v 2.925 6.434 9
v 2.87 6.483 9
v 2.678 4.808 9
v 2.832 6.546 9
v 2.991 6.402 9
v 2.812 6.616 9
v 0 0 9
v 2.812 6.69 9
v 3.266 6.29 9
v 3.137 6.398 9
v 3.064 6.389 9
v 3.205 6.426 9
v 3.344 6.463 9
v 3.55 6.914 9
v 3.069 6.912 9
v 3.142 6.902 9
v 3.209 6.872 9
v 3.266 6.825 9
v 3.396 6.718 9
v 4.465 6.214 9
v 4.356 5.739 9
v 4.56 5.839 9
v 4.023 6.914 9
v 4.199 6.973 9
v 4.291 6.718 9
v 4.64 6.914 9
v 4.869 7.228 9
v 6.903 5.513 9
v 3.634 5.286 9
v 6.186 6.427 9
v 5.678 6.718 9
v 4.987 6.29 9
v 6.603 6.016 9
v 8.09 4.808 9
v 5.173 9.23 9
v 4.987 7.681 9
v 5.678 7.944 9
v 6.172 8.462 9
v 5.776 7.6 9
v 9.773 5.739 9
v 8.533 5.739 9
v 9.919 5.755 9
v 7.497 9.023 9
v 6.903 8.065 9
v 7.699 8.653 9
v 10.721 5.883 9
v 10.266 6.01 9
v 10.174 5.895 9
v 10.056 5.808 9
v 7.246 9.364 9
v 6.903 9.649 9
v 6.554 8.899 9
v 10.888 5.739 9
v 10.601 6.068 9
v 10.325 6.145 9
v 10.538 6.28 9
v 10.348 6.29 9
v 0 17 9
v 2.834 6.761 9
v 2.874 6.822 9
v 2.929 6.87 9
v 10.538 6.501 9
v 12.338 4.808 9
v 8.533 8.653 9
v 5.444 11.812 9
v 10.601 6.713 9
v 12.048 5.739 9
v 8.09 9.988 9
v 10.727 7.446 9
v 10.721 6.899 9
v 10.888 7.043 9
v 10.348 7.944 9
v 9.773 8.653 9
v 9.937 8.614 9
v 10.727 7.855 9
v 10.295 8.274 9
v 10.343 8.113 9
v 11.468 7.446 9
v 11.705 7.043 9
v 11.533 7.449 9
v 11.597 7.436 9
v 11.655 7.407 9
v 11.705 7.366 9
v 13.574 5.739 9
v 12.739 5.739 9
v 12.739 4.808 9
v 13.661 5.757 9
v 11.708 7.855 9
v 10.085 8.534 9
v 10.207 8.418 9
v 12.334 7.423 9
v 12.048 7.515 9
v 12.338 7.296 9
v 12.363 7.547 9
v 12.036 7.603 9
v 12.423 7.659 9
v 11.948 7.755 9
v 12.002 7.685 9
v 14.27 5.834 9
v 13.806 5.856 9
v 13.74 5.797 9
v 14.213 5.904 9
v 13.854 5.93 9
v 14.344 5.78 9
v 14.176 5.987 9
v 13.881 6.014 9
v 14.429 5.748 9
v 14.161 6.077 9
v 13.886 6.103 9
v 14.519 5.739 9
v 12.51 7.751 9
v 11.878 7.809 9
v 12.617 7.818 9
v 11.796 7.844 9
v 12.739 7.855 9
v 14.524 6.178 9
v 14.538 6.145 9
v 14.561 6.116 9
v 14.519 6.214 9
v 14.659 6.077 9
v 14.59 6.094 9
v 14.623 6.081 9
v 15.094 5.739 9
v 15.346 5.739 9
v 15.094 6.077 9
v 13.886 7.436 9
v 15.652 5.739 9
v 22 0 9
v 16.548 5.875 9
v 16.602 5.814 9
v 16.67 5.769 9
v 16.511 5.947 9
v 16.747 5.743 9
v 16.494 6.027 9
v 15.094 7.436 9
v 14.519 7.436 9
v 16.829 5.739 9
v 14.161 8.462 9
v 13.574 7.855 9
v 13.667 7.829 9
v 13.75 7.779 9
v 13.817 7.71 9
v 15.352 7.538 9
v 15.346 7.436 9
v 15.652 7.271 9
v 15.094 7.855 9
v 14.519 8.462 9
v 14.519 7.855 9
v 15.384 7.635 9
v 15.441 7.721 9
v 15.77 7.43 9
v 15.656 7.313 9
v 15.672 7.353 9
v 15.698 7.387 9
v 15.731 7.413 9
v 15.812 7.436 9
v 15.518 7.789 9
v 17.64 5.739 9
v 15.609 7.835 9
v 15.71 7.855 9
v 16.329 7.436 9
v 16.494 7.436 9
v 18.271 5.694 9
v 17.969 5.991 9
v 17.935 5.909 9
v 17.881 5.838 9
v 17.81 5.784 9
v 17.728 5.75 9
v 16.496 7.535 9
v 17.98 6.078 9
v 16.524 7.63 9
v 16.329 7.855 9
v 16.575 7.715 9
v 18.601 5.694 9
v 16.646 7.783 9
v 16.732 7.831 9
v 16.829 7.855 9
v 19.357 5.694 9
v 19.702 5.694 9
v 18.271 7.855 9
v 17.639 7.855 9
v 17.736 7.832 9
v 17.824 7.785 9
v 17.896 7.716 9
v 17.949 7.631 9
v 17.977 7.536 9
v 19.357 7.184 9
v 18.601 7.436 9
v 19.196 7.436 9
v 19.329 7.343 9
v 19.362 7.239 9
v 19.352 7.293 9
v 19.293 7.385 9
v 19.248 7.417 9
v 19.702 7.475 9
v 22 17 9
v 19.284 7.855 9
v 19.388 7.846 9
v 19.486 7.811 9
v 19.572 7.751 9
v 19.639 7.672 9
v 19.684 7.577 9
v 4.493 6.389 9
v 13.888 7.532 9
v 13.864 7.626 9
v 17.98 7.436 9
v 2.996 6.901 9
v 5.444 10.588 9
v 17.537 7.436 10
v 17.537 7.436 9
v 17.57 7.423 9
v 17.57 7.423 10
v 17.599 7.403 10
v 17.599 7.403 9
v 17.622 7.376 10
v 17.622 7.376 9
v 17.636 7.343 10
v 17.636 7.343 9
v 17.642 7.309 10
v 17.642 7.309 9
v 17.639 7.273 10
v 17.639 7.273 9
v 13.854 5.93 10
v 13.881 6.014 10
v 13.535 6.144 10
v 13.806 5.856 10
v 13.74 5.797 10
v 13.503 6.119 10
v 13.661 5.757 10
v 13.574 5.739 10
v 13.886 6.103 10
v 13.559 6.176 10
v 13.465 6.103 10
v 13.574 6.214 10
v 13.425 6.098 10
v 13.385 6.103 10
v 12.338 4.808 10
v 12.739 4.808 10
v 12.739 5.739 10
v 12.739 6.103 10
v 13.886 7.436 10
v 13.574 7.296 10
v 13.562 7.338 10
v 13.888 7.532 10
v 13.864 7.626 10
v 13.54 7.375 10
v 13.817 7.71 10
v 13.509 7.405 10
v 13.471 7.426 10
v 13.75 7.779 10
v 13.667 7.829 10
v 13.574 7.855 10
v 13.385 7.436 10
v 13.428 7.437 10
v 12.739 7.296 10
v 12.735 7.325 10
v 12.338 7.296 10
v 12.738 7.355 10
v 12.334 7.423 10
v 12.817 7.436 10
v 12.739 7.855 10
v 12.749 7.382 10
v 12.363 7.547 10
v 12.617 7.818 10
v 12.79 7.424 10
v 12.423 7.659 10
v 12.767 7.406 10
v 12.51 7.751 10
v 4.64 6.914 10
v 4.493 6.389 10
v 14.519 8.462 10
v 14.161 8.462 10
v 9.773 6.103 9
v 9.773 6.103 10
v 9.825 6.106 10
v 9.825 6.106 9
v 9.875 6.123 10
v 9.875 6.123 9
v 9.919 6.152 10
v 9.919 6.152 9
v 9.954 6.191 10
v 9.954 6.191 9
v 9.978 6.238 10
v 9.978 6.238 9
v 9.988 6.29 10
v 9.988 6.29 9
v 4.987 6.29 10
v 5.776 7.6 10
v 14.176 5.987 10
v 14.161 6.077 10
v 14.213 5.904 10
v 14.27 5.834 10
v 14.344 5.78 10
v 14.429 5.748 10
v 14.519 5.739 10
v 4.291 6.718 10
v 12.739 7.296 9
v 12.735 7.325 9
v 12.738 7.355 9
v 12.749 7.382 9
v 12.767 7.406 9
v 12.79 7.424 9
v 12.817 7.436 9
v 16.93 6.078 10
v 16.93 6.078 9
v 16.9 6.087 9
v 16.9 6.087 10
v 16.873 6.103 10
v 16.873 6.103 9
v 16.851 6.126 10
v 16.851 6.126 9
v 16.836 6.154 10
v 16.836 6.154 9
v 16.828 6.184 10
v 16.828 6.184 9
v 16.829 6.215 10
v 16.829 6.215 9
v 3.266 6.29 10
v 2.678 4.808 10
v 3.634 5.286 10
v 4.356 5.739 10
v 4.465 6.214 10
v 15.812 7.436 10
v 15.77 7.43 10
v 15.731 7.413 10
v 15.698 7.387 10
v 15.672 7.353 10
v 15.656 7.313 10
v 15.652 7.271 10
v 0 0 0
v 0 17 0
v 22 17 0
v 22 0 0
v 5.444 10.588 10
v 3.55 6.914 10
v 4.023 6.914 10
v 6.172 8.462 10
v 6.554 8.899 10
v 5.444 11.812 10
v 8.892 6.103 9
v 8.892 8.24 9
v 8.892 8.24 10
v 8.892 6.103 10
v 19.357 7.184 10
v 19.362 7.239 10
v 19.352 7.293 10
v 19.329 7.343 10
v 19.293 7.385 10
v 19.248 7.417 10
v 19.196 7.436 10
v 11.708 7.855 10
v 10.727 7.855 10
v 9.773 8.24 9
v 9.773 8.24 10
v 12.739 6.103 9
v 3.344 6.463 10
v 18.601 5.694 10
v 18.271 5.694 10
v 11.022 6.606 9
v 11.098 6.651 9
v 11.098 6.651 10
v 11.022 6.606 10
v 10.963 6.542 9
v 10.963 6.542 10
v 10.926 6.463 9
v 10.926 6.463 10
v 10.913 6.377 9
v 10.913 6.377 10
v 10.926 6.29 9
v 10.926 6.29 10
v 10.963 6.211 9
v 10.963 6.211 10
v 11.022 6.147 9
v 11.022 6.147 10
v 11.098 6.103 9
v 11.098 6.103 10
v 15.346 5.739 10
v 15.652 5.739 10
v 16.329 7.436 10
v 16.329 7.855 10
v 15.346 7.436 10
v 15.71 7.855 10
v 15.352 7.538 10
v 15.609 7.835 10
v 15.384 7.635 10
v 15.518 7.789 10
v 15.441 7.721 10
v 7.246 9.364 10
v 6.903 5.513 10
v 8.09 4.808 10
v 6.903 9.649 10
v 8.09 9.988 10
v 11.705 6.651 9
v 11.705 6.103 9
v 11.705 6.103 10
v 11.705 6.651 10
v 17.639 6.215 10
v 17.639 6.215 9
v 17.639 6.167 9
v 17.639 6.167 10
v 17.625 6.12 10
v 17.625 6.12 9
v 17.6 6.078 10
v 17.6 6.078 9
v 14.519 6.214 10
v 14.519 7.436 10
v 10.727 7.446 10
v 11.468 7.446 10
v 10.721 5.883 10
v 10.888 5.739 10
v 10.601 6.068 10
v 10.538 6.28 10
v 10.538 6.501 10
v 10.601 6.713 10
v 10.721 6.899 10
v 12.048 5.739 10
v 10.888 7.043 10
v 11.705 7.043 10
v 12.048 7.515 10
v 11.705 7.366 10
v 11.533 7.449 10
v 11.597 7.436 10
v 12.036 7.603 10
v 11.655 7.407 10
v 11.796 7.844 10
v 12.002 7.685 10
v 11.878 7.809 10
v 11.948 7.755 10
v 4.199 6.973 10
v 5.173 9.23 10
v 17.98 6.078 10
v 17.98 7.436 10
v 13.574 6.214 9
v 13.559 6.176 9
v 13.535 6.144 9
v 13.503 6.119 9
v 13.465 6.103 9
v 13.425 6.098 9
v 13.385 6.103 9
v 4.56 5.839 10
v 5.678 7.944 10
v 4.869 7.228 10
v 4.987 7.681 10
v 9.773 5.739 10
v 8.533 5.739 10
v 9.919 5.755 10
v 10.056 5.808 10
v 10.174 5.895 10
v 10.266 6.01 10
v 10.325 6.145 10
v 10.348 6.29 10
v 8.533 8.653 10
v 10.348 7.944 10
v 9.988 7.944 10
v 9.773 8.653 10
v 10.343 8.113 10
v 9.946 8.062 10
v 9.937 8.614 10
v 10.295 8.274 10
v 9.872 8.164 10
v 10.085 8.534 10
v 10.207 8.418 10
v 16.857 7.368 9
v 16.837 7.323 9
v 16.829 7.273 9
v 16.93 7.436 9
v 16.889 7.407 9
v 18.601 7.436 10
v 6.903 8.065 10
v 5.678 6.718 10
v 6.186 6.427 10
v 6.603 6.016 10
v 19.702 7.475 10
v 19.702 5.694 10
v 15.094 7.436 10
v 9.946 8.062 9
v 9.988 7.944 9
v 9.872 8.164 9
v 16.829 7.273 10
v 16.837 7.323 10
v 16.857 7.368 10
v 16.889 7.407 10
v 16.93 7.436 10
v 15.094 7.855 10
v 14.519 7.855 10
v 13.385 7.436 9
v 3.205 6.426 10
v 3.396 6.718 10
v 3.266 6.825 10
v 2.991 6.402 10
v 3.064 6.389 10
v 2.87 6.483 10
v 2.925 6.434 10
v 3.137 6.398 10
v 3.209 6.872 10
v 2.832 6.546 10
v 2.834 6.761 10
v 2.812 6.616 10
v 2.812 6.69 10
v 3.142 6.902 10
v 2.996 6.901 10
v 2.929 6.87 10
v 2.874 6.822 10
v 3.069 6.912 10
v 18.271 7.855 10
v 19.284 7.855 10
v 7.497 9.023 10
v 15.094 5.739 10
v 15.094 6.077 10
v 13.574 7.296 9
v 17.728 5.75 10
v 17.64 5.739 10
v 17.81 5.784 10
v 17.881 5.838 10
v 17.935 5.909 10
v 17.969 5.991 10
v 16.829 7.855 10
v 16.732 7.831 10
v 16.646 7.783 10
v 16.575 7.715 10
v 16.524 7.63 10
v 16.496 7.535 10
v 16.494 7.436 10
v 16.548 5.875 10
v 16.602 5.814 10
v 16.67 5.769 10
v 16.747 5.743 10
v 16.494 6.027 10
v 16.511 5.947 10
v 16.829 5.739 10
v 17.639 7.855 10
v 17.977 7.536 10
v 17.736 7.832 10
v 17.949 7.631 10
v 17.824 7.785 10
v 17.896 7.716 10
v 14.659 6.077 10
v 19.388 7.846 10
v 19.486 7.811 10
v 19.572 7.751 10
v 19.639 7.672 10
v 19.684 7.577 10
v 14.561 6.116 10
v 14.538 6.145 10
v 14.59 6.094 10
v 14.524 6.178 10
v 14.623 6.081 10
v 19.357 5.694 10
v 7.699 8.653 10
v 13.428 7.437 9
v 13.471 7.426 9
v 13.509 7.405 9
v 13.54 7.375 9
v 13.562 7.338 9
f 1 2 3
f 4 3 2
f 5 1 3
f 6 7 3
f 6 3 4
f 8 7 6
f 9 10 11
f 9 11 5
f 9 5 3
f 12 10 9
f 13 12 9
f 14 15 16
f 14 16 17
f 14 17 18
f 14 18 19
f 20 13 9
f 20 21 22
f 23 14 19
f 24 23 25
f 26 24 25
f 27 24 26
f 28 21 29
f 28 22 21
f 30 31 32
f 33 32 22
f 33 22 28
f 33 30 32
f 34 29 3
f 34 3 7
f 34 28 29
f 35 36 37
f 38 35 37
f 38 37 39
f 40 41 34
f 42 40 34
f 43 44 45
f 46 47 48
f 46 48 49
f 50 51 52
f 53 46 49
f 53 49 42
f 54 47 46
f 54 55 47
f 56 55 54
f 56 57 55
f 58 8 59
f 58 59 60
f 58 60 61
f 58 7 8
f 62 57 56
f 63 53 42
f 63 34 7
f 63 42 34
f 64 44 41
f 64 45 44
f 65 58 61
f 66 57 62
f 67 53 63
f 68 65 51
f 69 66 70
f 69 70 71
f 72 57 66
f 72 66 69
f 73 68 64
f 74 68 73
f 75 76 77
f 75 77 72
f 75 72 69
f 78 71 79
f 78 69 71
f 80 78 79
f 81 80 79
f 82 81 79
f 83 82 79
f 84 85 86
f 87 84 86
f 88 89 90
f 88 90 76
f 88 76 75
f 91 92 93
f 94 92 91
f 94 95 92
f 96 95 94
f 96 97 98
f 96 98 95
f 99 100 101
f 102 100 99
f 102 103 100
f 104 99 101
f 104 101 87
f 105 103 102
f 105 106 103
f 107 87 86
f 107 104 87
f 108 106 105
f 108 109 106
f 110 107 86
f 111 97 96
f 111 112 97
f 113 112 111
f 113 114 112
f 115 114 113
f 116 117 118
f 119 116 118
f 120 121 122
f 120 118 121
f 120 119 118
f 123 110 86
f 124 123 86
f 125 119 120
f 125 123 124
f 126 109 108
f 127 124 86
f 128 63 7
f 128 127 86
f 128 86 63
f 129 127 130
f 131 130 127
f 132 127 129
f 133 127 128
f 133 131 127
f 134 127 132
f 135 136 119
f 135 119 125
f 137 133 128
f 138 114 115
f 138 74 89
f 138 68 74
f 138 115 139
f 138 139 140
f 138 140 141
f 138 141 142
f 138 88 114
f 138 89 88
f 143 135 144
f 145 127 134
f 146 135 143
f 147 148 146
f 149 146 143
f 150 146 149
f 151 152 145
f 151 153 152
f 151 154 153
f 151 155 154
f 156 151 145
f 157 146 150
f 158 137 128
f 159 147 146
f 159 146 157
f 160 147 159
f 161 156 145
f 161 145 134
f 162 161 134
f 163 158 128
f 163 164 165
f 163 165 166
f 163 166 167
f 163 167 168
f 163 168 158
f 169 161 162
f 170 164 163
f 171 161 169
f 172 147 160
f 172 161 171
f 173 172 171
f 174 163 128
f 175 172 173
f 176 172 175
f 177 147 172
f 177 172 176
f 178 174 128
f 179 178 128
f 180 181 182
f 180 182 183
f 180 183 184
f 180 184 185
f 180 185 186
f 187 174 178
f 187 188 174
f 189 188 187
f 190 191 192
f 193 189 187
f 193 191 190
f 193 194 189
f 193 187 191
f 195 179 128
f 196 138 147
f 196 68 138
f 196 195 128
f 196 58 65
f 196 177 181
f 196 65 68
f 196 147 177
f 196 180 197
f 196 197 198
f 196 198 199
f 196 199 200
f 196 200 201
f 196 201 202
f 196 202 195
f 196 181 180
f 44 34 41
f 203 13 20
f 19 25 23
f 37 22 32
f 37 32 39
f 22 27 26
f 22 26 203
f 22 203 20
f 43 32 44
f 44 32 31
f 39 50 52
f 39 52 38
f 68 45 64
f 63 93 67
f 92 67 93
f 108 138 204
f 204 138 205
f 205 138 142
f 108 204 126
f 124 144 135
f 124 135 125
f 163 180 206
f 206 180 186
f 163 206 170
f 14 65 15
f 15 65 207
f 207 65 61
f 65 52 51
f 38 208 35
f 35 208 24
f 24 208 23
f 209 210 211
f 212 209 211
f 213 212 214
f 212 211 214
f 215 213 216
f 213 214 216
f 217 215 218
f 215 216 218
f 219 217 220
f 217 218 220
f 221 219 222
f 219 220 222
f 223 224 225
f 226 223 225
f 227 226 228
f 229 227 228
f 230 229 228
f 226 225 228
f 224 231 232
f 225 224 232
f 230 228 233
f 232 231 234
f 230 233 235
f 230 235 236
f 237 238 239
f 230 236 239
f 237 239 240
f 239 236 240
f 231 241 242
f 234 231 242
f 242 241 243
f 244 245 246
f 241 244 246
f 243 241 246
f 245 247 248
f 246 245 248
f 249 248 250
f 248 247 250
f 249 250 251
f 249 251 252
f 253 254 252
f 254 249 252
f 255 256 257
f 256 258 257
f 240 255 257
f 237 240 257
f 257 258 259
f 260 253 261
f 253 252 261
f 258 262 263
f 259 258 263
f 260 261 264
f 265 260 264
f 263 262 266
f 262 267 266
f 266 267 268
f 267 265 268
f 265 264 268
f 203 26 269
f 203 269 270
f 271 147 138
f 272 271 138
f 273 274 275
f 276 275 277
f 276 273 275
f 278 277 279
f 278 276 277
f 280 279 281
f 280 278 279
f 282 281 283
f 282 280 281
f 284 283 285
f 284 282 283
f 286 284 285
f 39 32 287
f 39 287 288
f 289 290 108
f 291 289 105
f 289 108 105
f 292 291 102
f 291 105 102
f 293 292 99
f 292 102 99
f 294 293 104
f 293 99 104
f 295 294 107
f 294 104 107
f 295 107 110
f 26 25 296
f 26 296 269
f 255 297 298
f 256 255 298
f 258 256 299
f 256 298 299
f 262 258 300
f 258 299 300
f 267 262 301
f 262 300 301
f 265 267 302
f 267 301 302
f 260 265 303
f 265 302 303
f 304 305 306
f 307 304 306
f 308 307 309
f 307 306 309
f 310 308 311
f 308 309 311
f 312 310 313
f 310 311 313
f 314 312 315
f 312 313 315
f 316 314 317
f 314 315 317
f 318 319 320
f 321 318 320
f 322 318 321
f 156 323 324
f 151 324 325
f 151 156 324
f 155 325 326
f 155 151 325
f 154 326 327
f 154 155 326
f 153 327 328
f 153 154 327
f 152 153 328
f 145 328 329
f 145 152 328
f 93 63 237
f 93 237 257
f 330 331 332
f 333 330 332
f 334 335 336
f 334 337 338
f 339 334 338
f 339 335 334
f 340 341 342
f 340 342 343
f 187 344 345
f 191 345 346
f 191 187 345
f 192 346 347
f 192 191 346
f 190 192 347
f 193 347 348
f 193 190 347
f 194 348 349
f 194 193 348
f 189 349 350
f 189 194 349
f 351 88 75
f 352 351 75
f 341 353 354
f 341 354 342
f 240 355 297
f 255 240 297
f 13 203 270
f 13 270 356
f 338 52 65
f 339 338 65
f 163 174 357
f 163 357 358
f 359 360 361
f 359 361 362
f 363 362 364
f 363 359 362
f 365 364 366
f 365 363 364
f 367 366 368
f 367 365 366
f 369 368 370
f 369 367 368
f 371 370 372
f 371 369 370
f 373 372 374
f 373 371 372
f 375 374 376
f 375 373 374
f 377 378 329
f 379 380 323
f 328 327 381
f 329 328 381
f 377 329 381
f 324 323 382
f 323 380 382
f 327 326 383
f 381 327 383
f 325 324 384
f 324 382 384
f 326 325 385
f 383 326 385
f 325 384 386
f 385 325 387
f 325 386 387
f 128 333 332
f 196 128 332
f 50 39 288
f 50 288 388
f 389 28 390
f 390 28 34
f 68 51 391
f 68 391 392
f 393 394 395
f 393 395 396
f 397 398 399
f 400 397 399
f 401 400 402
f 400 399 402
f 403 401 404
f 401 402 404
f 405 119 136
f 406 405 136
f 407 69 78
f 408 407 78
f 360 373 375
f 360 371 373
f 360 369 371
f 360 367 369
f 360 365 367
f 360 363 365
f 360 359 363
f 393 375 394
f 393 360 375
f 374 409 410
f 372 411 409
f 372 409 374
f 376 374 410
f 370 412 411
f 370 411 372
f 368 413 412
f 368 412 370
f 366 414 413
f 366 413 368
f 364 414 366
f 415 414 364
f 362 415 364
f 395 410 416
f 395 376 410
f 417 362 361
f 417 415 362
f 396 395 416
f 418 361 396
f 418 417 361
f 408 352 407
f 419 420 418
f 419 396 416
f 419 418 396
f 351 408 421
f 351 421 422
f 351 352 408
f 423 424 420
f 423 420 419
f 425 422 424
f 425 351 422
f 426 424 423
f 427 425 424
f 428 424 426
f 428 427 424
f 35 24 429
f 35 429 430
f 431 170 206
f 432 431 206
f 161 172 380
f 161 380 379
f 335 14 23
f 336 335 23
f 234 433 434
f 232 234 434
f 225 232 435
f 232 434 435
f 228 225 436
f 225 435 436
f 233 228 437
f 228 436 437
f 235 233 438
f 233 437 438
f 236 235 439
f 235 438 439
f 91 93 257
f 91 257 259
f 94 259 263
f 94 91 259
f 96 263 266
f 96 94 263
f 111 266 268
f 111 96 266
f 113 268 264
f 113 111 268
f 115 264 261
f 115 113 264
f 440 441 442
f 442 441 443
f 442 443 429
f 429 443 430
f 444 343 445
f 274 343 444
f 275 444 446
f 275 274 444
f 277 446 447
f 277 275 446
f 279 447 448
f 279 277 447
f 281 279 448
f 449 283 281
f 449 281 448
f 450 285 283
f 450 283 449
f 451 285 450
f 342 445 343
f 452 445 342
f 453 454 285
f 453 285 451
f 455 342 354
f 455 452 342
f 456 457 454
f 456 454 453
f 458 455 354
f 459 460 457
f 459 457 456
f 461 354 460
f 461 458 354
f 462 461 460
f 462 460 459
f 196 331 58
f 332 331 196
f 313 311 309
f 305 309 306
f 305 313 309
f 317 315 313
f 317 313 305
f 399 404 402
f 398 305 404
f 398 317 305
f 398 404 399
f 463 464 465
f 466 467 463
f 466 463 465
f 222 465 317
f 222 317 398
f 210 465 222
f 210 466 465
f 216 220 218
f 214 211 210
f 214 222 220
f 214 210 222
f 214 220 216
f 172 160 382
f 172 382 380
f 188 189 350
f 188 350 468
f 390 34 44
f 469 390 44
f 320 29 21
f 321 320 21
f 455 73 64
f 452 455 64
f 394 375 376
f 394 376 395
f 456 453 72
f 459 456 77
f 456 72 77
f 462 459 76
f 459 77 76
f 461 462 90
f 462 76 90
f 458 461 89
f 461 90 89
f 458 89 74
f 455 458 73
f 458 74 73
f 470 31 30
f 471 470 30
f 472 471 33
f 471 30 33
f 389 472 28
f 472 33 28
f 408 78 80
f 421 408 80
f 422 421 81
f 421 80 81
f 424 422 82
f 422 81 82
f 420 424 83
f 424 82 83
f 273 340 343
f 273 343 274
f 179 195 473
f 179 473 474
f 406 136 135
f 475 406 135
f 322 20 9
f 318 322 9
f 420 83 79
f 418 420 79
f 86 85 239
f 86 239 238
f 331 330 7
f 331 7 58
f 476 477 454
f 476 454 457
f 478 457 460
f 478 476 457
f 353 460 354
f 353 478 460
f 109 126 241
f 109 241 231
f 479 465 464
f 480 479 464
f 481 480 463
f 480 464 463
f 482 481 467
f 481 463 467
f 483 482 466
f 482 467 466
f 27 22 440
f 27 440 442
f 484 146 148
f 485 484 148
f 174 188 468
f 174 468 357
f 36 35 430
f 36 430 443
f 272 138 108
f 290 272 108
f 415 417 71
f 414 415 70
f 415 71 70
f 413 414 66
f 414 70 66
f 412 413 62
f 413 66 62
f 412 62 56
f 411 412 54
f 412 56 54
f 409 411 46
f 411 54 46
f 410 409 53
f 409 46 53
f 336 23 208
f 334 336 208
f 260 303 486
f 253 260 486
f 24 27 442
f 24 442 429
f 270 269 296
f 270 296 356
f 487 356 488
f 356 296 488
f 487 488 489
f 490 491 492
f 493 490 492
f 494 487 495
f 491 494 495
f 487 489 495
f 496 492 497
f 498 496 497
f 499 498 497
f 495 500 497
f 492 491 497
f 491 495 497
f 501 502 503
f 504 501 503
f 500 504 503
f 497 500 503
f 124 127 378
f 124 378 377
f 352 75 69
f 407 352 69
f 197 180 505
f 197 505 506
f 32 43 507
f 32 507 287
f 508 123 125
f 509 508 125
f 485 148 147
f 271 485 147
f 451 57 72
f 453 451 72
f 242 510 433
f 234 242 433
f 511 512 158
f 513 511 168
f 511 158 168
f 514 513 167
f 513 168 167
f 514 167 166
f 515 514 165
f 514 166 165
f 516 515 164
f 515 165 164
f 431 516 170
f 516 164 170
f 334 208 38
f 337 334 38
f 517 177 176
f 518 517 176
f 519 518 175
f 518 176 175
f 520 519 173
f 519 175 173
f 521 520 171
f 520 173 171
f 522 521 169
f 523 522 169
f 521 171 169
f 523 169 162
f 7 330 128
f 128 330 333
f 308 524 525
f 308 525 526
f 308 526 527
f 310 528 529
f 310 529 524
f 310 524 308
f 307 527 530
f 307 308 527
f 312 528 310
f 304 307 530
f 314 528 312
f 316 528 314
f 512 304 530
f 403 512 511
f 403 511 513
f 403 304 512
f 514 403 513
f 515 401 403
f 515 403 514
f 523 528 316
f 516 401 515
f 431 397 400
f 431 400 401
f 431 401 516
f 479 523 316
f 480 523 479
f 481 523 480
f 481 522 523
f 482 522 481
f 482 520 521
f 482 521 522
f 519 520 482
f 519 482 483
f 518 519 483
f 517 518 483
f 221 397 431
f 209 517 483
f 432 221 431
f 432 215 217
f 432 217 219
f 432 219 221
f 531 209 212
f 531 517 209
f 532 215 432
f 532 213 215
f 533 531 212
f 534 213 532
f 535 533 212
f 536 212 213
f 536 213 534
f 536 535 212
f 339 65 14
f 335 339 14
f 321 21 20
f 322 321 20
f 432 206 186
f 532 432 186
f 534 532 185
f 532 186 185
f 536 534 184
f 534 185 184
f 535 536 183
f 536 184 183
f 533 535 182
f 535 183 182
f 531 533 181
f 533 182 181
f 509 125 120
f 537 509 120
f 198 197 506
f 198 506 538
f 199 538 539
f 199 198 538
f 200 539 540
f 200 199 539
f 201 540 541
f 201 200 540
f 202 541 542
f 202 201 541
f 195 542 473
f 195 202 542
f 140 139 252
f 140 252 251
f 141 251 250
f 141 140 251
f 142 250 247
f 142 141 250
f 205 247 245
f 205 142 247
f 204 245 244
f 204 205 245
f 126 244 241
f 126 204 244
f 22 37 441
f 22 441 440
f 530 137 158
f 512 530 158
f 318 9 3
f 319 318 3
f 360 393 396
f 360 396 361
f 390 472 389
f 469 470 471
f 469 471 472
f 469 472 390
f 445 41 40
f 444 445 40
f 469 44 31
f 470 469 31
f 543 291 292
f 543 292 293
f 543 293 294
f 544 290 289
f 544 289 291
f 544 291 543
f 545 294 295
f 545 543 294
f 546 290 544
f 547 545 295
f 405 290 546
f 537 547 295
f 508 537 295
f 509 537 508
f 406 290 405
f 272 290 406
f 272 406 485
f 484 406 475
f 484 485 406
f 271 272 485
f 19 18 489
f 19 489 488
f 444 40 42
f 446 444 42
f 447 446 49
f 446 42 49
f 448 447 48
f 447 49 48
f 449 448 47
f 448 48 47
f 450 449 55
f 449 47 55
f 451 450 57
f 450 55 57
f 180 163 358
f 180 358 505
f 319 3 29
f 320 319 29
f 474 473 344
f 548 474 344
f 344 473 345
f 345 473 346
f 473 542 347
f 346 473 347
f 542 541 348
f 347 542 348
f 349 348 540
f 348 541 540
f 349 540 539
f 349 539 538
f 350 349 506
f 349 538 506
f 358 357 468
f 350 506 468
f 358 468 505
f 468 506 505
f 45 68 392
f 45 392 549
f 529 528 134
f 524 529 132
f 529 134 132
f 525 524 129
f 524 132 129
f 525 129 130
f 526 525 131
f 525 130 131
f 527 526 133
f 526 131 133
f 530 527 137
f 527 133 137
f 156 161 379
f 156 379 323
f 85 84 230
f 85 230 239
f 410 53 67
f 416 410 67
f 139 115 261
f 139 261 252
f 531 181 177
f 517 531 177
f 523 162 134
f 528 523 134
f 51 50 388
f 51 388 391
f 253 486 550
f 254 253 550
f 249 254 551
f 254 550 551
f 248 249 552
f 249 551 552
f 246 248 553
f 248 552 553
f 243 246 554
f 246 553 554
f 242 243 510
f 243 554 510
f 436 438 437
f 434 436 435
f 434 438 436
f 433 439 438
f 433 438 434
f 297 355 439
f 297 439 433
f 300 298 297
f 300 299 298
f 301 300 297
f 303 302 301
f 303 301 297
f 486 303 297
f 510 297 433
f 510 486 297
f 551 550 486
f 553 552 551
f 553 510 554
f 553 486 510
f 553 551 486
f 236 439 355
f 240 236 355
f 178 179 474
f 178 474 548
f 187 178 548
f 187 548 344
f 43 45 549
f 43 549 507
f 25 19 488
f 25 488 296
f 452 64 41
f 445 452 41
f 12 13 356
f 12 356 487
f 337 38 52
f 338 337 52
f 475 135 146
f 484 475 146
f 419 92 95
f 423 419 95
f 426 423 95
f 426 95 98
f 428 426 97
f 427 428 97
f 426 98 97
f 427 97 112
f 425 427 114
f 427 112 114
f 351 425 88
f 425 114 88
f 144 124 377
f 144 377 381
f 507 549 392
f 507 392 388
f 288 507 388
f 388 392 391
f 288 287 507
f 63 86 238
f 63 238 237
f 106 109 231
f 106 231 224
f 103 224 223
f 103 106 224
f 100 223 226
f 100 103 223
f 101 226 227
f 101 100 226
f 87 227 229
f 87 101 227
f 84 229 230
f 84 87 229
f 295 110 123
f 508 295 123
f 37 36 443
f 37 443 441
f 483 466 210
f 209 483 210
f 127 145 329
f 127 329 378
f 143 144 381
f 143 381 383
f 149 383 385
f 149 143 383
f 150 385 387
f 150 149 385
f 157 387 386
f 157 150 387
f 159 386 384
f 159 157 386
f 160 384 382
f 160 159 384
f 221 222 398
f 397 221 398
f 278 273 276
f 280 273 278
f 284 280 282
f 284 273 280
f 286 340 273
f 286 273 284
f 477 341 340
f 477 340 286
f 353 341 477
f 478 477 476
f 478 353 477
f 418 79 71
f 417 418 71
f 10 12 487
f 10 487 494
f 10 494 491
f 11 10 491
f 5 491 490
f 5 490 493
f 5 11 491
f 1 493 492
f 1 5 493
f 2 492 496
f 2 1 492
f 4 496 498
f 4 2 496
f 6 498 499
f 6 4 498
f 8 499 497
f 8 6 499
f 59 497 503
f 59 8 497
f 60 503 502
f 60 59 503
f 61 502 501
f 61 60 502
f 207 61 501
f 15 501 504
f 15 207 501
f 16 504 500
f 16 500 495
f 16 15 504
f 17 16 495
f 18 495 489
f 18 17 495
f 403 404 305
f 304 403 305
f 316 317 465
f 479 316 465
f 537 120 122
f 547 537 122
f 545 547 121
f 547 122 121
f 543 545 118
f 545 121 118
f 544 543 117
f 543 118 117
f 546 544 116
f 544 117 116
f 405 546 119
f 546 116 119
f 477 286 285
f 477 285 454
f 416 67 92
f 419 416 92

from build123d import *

# Parameters (mm, degrees)
BOSS_EXTRU_1_DEPTH    = 10
BOSS_EXTRU_1_2_DEPTH  = 10
BOSS_EXTRU_1_3_DEPTH  = 10
BOSS_EXTRU_1_4_DEPTH  = 10
BOSS_EXTRU_1_5_DEPTH  = 10
BOSS_EXTRU_1_6_DEPTH  = 10
BOSS_EXTRU_1_7_DEPTH  = 10
BOSS_EXTRU_1_8_DEPTH  = 10
BOSS_EXTRU_1_9_DEPTH  = 10
BOSS_EXTRU_1_10_DEPTH = 10
BOSS_EXTRU_1_11_DEPTH = 10
BOSS_EXTRU_1_12_DEPTH = 10
BOSS_EXTRU_1_13_DEPTH = 10
ESQUISSE2_W           = 22
ESQUISSE2_H           = 17
BOSS_EXTRU_2_DEPTH    = 9


with BuildPart() as part:
    # Esquisse1 → Boss.-Extru.1 (new body)
    with BuildSketch(Plane.XY):
        Polygon((5.443717547, 11.812499229), (3.550061207, 6.914484272), (4.023475292, 6.914484272), (5.443717547, 10.587995489), (6.172046909, 8.462184165), (6.554419824, 8.899181782), align=None)
    extrude(amount=BOSS_EXTRU_1_DEPTH)



with BuildPart() as body_2:
    # Esquisse1 → Boss.-Extru.1 2 (new body)
    with BuildSketch(Plane.XY):
        with BuildLine():
            Line((6.902626833, 8.065470566), (5.678236467, 6.71845465))
            ThreePointArc((5.678236467, 6.71845465), (6.407694377, 6.234618767), (6.902626833, 5.512643789))
            Line((6.902626833, 5.512643789), (8.09044996, 4.808141168))
            Line((8.09044996, 4.808141168), (6.902626833, 8.065470566))
        make_face()
    extrude(amount=BOSS_EXTRU_1_2_DEPTH)


with BuildPart() as body_3:
    # Esquisse1 → Boss.-Extru.1 3 (new body)
    with BuildSketch(Plane.XY):
        Polygon((7.496538396, 9.023251364), (4.987277184, 6.289858676), (5.776031703, 7.600137795), (7.245503612, 9.363504086), (6.902626833, 9.649234735), (8.09044996, 9.988029647), (7.698590784, 8.65325933), align=None)
    extrude(amount=BOSS_EXTRU_1_3_DEPTH)


with BuildPart() as body_4:
    # Esquisse1 → Boss.-Extru.1 4 (new body)
    with BuildSketch(Plane.XY):
        with BuildLine():
            ThreePointArc((19.283756817, 7.855107538), (19.571781089, 7.751485217), (19.70217296, 7.474549255))
            Line((19.70217296, 7.474549255), (19.70217296, 5.694123098))
            Line((19.70217296, 5.694123098), (19.357163158, 5.694123098))
            Line((19.357163158, 5.694123098), (19.357163158, 7.183832057))
            ThreePointArc((19.357163158, 7.183832057), (19.328585973, 7.343227565), (19.195669208, 7.435730089))
            Line((19.195669208, 7.435730089), (18.601077847, 7.435730089))
            Line((18.601077847, 7.435730089), (18.601077847, 5.694123098))
            Line((18.601077847, 5.694123098), (18.270749313, 5.694123098))
            Line((18.270749313, 5.694123098), (18.270749313, 7.855107538))
            Line((18.270749313, 7.855107538), (19.283756817, 7.855107538))
        make_face()
    extrude(amount=BOSS_EXTRU_1_4_DEPTH)


with BuildPart() as body_5:
    # Esquisse1 → Boss.-Extru.1 5 (new body)
    with BuildSketch(Plane.XY):
        with BuildLine():
            Line((16.494479646, 7.435730089), (16.494479646, 6.027121876))
            ThreePointArc((16.494479646, 6.027121876), (16.601754173, 5.813714283), (16.828510675, 5.738666872))
            Line((16.828510675, 5.738666872), (17.640470987, 5.738666872))
            ThreePointArc((17.640470987, 5.738666872), (17.880768825, 5.838201495), (17.980303448, 6.078499332))
            Line((17.980303448, 6.078499332), (17.980303448, 7.435730089))
            ThreePointArc((17.980303448, 7.435730089), (17.896289803, 7.716195302), (17.638564331, 7.855107538))
            Line((17.638564331, 7.855107538), (16.828516054, 7.855107538))
            ThreePointArc((16.828516054, 7.855107538), (16.574641936, 7.714600019), (16.494479646, 7.435730089))
        make_face()
        with BuildLine():
            Line((17.638564331, 7.273362699), (17.638564331, 6.215464578))
            ThreePointArc((17.638564331, 6.215464578), (17.633763509, 6.142841489), (17.599745165, 6.078499332))
            Line((17.599745165, 6.078499332), (16.929772089, 6.078499332))
            ThreePointArc((16.929772089, 6.078499332), (16.85077764, 6.126011144), (16.828516054, 6.215464578))
            Line((16.828516054, 6.215464578), (16.828516054, 7.273362699))
            ThreePointArc((16.828516054, 7.273362699), (16.85715067, 7.368261985), (16.929772089, 7.435730089))
            Line((16.929772089, 7.435730089), (17.537308296, 7.435730089))
            ThreePointArc((17.537308296, 7.435730089), (17.621563701, 7.375517206), (17.638564331, 7.273362699))
        make_face(mode=Mode.SUBTRACT)
    extrude(amount=BOSS_EXTRU_1_5_DEPTH)


with BuildPart() as body_6:
    # Esquisse1 → Boss.-Extru.1 6 (new body)
    with BuildSketch(Plane.XY):
        with BuildLine():
            ThreePointArc((15.811686316, 7.435730089), (15.697522048, 7.386612234), (15.651527288, 7.271154337))
            Line((15.651527288, 7.271154337), (15.651527288, 5.738666872))
            Line((15.651527288, 5.738666872), (15.345769144, 5.738666872))
            Line((15.345769144, 5.738666872), (15.345769144, 7.435730089))
            ThreePointArc((15.345769144, 7.435730089), (15.440912126, 7.720805224), (15.709766935, 7.855107538))
            Line((15.709766935, 7.855107538), (16.328563178, 7.855107538))
            Line((16.328563178, 7.855107538), (16.328563178, 7.435730089))
            Line((16.328563178, 7.435730089), (15.811686316, 7.435730089))
        make_face()
    extrude(amount=BOSS_EXTRU_1_6_DEPTH)


with BuildPart() as body_7:
    # Esquisse1 → Boss.-Extru.1 7 (new body)
    with BuildSketch(Plane.XY):
        with BuildLine():
            Line((14.161212762, 8.462184165), (14.161212762, 6.076587297))
            ThreePointArc((14.161212762, 6.076587297), (14.270058526, 5.833555854), (14.518873285, 5.738672251))
            Line((14.518873285, 5.738672251), (15.09368484, 5.738672251))
            Line((15.09368484, 5.738672251), (15.09368484, 6.076587297))
            Line((15.09368484, 6.076587297), (14.659382776, 6.076587297))
            ThreePointArc((14.659382776, 6.076587297), (14.560703645, 6.116109364), (14.518873285, 6.213832369))
            Line((14.518873285, 6.213832369), (14.518873285, 7.435730089))
            Line((14.518873285, 7.435730089), (15.09368484, 7.435730089))
            Line((15.09368484, 7.435730089), (15.09368484, 7.855107538))
            Line((15.09368484, 7.855107538), (14.518873285, 7.855107538))
            Line((14.518873285, 7.855107538), (14.518873285, 8.462184165))
            Line((14.518873285, 8.462184165), (14.161212762, 8.462184165))
        make_face()
    extrude(amount=BOSS_EXTRU_1_7_DEPTH)


with BuildPart() as body_8:
    # Esquisse1 → Boss.-Extru.1 8 (new body)
    with BuildSketch(Plane.XY):
        with BuildLine():
            ThreePointArc((13.886262231, 6.102623129), (13.805699319, 5.85605539), (13.574383017, 5.738672251))
            Line((13.574383017, 5.738672251), (12.738992267, 5.738672251))
            Line((12.738992267, 5.738672251), (12.738992267, 4.808141168))
            Line((12.738992267, 4.808141168), (12.338004706, 4.808141168))
            Line((12.338004706, 4.808141168), (12.338004706, 7.295933822))
            ThreePointArc((12.338004706, 7.295933822), (12.422689818, 7.658567923), (12.738992267, 7.855107538))
            Line((12.738992267, 7.855107538), (13.574383017, 7.855107538))
            ThreePointArc((13.574383017, 7.855107538), (13.817178537, 7.710011113), (13.886262231, 7.435730089))
            Line((13.886262231, 7.435730089), (13.886262231, 6.102623129))
        make_face()
        with BuildLine():
            Line((13.574383017, 7.295933822), (13.574383017, 6.213832369))
            ThreePointArc((13.574383017, 6.213832369), (13.502737587, 6.119010995), (13.38502778, 6.102623129))
            Line((13.38502778, 6.102623129), (12.738992267, 6.102623129))
            Line((12.738992267, 6.102623129), (12.738992267, 7.295933822))
            ThreePointArc((12.738992267, 7.295933822), (12.749024413, 7.381980031), (12.81696207, 7.435730089))
            Line((12.81696207, 7.435730089), (13.38502778, 7.435730089))
            ThreePointArc((13.38502778, 7.435730089), (13.508658154, 7.405048709), (13.574383017, 7.295933822))
        make_face(mode=Mode.SUBTRACT)
    extrude(amount=BOSS_EXTRU_1_8_DEPTH)


with BuildPart() as body_9:
    # Esquisse1 → Boss.-Extru.1 9 (new body)
    with BuildSketch(Plane.XY):
        with BuildLine():
            Line((10.727068381, 7.446462813), (11.468195577, 7.446462813))
            ThreePointArc((11.468195577, 7.446462813), (11.596758234, 7.435730089), (11.705162978, 7.365787542))
            Line((11.705162978, 7.365787542), (11.705162978, 7.043119919))
            Line((11.705162978, 7.043119919), (10.888410557, 7.043119919))
            ThreePointArc((10.888410557, 7.043119919), (10.530519911, 6.390896085), (10.888410557, 5.738672251))
            Line((10.888410557, 5.738672251), (12.047997327, 5.738672251))
            Line((12.047997327, 5.738672251), (12.047997327, 7.514651407))
            ThreePointArc((12.047997327, 7.514651407), (11.948280035, 7.755390246), (11.707541196, 7.855107538))
            Line((11.707541196, 7.855107538), (10.727068381, 7.855107538))
            Line((10.727068381, 7.855107538), (10.727068381, 7.446462813))
        make_face()
        with BuildLine():
            ThreePointArc((11.097631979, 6.65067692), (10.91259355, 6.376650024), (11.097631979, 6.102623129))
            Line((11.097631979, 6.102623129), (11.705154613, 6.102623129))
            Line((11.705154613, 6.102623129), (11.705154613, 6.65067692))
            Line((11.705154613, 6.65067692), (11.097631979, 6.65067692))
        make_face(mode=Mode.SUBTRACT)
    extrude(amount=BOSS_EXTRU_1_9_DEPTH)


with BuildPart() as body_10:
    # Esquisse1 → Boss.-Extru.1 10 (new body)
    with BuildSketch(Plane.XY):
        with BuildLine():
            Line((8.533065369, 5.73880671), (9.772658698, 5.73880671))
            ThreePointArc((9.772658698, 5.73880671), (10.174227228, 5.895270347), (10.34754256, 6.289858676))
            Line((10.34754256, 6.289858676), (10.34754256, 7.944071011))
            ThreePointArc((10.34754256, 7.944071011), (10.206978339, 8.417727517), (9.772658698, 8.65325933))
            Line((9.772658698, 8.65325933), (8.533065369, 8.65325933))
            Line((8.533065369, 8.65325933), (8.533065369, 5.73880671))
        make_face()
        with BuildLine():
            ThreePointArc((9.772658698, 6.102623129), (9.919227173, 6.151592523), (9.988240146, 6.289858676))
            Line((9.988240146, 6.289858676), (9.988240146, 7.944071011))
            ThreePointArc((9.988240146, 7.944071011), (9.912548031, 8.115618007), (9.772658698, 8.240472493))
            Line((9.772658698, 8.240472493), (8.892367783, 8.240472493))
            Line((8.892367783, 8.240472493), (8.892367783, 6.102623129))
            Line((8.892367783, 6.102623129), (9.772658698, 6.102623129))
        make_face(mode=Mode.SUBTRACT)
    extrude(amount=BOSS_EXTRU_1_10_DEPTH)


with BuildPart() as body_11:
    # Esquisse1 → Boss.-Extru.1 11 (new body)
    with BuildSketch(Plane.XY):
        Polygon((4.355542191, 5.73880671), (4.464623497, 6.213832369), (3.265683859, 6.289858676), (2.677895095, 4.808141168), (3.633556258, 5.286480868), align=None)
    extrude(amount=BOSS_EXTRU_1_11_DEPTH)


with BuildPart() as body_12:
    # Esquisse1 → Boss.-Extru.1 12 (new body)
    with BuildSketch(Plane.XY):
        Polygon((4.199345564, 6.972570668), (5.173183133, 9.229859022), (4.987277184, 7.680642785), (5.678236467, 7.944071011), (4.560132448, 5.83905846), (4.868736322, 7.227775894), align=None)
    extrude(amount=BOSS_EXTRU_1_12_DEPTH)


with BuildPart() as body_13:
    # Esquisse1 → Boss.-Extru.1 13 (new body)
    with BuildSketch(Plane.XY):
        with BuildLine():
            Line((4.49284458, 6.389276558), (3.344161613, 6.46328358))
            Line((3.344161613, 6.46328358), (3.204994268, 6.426280069))
            ThreePointArc((3.204994268, 6.426280069), (2.812494667, 6.690009625), (3.265683859, 6.825023594))
            Line((3.265683859, 6.825023594), (3.396366031, 6.71845465))
            Line((3.396366031, 6.71845465), (4.291345624, 6.71845465))
            Line((4.291345624, 6.71845465), (4.640038971, 6.914484272))
            Line((4.640038971, 6.914484272), (4.49284458, 6.389276558))
        make_face()
    extrude(amount=BOSS_EXTRU_1_13_DEPTH)


with BuildPart() as part_1:
    add(part.part)

    add(body_2.part)  # Boss.-Extru.2 merges body 2

    add(body_3.part)  # Boss.-Extru.2 merges body 3

    add(body_4.part)  # Boss.-Extru.2 merges body 4

    add(body_5.part)  # Boss.-Extru.2 merges body 5

    add(body_6.part)  # Boss.-Extru.2 merges body 6

    add(body_7.part)  # Boss.-Extru.2 merges body 7

    add(body_8.part)  # Boss.-Extru.2 merges body 8

    add(body_9.part)  # Boss.-Extru.2 merges body 9

    add(body_10.part)  # Boss.-Extru.2 merges body 10

    add(body_11.part)  # Boss.-Extru.2 merges body 11

    add(body_12.part)  # Boss.-Extru.2 merges body 12

    add(body_13.part)  # Boss.-Extru.2 merges body 13
    # Esquisse2 → Boss.-Extru.2 (add)
    with BuildSketch(Plane.XY):
        with Locations((11, 8.5)):
            Rectangle(ESQUISSE2_W, ESQUISSE2_H)
    extrude(amount=BOSS_EXTRU_2_DEPTH)


solid = part_1.part
